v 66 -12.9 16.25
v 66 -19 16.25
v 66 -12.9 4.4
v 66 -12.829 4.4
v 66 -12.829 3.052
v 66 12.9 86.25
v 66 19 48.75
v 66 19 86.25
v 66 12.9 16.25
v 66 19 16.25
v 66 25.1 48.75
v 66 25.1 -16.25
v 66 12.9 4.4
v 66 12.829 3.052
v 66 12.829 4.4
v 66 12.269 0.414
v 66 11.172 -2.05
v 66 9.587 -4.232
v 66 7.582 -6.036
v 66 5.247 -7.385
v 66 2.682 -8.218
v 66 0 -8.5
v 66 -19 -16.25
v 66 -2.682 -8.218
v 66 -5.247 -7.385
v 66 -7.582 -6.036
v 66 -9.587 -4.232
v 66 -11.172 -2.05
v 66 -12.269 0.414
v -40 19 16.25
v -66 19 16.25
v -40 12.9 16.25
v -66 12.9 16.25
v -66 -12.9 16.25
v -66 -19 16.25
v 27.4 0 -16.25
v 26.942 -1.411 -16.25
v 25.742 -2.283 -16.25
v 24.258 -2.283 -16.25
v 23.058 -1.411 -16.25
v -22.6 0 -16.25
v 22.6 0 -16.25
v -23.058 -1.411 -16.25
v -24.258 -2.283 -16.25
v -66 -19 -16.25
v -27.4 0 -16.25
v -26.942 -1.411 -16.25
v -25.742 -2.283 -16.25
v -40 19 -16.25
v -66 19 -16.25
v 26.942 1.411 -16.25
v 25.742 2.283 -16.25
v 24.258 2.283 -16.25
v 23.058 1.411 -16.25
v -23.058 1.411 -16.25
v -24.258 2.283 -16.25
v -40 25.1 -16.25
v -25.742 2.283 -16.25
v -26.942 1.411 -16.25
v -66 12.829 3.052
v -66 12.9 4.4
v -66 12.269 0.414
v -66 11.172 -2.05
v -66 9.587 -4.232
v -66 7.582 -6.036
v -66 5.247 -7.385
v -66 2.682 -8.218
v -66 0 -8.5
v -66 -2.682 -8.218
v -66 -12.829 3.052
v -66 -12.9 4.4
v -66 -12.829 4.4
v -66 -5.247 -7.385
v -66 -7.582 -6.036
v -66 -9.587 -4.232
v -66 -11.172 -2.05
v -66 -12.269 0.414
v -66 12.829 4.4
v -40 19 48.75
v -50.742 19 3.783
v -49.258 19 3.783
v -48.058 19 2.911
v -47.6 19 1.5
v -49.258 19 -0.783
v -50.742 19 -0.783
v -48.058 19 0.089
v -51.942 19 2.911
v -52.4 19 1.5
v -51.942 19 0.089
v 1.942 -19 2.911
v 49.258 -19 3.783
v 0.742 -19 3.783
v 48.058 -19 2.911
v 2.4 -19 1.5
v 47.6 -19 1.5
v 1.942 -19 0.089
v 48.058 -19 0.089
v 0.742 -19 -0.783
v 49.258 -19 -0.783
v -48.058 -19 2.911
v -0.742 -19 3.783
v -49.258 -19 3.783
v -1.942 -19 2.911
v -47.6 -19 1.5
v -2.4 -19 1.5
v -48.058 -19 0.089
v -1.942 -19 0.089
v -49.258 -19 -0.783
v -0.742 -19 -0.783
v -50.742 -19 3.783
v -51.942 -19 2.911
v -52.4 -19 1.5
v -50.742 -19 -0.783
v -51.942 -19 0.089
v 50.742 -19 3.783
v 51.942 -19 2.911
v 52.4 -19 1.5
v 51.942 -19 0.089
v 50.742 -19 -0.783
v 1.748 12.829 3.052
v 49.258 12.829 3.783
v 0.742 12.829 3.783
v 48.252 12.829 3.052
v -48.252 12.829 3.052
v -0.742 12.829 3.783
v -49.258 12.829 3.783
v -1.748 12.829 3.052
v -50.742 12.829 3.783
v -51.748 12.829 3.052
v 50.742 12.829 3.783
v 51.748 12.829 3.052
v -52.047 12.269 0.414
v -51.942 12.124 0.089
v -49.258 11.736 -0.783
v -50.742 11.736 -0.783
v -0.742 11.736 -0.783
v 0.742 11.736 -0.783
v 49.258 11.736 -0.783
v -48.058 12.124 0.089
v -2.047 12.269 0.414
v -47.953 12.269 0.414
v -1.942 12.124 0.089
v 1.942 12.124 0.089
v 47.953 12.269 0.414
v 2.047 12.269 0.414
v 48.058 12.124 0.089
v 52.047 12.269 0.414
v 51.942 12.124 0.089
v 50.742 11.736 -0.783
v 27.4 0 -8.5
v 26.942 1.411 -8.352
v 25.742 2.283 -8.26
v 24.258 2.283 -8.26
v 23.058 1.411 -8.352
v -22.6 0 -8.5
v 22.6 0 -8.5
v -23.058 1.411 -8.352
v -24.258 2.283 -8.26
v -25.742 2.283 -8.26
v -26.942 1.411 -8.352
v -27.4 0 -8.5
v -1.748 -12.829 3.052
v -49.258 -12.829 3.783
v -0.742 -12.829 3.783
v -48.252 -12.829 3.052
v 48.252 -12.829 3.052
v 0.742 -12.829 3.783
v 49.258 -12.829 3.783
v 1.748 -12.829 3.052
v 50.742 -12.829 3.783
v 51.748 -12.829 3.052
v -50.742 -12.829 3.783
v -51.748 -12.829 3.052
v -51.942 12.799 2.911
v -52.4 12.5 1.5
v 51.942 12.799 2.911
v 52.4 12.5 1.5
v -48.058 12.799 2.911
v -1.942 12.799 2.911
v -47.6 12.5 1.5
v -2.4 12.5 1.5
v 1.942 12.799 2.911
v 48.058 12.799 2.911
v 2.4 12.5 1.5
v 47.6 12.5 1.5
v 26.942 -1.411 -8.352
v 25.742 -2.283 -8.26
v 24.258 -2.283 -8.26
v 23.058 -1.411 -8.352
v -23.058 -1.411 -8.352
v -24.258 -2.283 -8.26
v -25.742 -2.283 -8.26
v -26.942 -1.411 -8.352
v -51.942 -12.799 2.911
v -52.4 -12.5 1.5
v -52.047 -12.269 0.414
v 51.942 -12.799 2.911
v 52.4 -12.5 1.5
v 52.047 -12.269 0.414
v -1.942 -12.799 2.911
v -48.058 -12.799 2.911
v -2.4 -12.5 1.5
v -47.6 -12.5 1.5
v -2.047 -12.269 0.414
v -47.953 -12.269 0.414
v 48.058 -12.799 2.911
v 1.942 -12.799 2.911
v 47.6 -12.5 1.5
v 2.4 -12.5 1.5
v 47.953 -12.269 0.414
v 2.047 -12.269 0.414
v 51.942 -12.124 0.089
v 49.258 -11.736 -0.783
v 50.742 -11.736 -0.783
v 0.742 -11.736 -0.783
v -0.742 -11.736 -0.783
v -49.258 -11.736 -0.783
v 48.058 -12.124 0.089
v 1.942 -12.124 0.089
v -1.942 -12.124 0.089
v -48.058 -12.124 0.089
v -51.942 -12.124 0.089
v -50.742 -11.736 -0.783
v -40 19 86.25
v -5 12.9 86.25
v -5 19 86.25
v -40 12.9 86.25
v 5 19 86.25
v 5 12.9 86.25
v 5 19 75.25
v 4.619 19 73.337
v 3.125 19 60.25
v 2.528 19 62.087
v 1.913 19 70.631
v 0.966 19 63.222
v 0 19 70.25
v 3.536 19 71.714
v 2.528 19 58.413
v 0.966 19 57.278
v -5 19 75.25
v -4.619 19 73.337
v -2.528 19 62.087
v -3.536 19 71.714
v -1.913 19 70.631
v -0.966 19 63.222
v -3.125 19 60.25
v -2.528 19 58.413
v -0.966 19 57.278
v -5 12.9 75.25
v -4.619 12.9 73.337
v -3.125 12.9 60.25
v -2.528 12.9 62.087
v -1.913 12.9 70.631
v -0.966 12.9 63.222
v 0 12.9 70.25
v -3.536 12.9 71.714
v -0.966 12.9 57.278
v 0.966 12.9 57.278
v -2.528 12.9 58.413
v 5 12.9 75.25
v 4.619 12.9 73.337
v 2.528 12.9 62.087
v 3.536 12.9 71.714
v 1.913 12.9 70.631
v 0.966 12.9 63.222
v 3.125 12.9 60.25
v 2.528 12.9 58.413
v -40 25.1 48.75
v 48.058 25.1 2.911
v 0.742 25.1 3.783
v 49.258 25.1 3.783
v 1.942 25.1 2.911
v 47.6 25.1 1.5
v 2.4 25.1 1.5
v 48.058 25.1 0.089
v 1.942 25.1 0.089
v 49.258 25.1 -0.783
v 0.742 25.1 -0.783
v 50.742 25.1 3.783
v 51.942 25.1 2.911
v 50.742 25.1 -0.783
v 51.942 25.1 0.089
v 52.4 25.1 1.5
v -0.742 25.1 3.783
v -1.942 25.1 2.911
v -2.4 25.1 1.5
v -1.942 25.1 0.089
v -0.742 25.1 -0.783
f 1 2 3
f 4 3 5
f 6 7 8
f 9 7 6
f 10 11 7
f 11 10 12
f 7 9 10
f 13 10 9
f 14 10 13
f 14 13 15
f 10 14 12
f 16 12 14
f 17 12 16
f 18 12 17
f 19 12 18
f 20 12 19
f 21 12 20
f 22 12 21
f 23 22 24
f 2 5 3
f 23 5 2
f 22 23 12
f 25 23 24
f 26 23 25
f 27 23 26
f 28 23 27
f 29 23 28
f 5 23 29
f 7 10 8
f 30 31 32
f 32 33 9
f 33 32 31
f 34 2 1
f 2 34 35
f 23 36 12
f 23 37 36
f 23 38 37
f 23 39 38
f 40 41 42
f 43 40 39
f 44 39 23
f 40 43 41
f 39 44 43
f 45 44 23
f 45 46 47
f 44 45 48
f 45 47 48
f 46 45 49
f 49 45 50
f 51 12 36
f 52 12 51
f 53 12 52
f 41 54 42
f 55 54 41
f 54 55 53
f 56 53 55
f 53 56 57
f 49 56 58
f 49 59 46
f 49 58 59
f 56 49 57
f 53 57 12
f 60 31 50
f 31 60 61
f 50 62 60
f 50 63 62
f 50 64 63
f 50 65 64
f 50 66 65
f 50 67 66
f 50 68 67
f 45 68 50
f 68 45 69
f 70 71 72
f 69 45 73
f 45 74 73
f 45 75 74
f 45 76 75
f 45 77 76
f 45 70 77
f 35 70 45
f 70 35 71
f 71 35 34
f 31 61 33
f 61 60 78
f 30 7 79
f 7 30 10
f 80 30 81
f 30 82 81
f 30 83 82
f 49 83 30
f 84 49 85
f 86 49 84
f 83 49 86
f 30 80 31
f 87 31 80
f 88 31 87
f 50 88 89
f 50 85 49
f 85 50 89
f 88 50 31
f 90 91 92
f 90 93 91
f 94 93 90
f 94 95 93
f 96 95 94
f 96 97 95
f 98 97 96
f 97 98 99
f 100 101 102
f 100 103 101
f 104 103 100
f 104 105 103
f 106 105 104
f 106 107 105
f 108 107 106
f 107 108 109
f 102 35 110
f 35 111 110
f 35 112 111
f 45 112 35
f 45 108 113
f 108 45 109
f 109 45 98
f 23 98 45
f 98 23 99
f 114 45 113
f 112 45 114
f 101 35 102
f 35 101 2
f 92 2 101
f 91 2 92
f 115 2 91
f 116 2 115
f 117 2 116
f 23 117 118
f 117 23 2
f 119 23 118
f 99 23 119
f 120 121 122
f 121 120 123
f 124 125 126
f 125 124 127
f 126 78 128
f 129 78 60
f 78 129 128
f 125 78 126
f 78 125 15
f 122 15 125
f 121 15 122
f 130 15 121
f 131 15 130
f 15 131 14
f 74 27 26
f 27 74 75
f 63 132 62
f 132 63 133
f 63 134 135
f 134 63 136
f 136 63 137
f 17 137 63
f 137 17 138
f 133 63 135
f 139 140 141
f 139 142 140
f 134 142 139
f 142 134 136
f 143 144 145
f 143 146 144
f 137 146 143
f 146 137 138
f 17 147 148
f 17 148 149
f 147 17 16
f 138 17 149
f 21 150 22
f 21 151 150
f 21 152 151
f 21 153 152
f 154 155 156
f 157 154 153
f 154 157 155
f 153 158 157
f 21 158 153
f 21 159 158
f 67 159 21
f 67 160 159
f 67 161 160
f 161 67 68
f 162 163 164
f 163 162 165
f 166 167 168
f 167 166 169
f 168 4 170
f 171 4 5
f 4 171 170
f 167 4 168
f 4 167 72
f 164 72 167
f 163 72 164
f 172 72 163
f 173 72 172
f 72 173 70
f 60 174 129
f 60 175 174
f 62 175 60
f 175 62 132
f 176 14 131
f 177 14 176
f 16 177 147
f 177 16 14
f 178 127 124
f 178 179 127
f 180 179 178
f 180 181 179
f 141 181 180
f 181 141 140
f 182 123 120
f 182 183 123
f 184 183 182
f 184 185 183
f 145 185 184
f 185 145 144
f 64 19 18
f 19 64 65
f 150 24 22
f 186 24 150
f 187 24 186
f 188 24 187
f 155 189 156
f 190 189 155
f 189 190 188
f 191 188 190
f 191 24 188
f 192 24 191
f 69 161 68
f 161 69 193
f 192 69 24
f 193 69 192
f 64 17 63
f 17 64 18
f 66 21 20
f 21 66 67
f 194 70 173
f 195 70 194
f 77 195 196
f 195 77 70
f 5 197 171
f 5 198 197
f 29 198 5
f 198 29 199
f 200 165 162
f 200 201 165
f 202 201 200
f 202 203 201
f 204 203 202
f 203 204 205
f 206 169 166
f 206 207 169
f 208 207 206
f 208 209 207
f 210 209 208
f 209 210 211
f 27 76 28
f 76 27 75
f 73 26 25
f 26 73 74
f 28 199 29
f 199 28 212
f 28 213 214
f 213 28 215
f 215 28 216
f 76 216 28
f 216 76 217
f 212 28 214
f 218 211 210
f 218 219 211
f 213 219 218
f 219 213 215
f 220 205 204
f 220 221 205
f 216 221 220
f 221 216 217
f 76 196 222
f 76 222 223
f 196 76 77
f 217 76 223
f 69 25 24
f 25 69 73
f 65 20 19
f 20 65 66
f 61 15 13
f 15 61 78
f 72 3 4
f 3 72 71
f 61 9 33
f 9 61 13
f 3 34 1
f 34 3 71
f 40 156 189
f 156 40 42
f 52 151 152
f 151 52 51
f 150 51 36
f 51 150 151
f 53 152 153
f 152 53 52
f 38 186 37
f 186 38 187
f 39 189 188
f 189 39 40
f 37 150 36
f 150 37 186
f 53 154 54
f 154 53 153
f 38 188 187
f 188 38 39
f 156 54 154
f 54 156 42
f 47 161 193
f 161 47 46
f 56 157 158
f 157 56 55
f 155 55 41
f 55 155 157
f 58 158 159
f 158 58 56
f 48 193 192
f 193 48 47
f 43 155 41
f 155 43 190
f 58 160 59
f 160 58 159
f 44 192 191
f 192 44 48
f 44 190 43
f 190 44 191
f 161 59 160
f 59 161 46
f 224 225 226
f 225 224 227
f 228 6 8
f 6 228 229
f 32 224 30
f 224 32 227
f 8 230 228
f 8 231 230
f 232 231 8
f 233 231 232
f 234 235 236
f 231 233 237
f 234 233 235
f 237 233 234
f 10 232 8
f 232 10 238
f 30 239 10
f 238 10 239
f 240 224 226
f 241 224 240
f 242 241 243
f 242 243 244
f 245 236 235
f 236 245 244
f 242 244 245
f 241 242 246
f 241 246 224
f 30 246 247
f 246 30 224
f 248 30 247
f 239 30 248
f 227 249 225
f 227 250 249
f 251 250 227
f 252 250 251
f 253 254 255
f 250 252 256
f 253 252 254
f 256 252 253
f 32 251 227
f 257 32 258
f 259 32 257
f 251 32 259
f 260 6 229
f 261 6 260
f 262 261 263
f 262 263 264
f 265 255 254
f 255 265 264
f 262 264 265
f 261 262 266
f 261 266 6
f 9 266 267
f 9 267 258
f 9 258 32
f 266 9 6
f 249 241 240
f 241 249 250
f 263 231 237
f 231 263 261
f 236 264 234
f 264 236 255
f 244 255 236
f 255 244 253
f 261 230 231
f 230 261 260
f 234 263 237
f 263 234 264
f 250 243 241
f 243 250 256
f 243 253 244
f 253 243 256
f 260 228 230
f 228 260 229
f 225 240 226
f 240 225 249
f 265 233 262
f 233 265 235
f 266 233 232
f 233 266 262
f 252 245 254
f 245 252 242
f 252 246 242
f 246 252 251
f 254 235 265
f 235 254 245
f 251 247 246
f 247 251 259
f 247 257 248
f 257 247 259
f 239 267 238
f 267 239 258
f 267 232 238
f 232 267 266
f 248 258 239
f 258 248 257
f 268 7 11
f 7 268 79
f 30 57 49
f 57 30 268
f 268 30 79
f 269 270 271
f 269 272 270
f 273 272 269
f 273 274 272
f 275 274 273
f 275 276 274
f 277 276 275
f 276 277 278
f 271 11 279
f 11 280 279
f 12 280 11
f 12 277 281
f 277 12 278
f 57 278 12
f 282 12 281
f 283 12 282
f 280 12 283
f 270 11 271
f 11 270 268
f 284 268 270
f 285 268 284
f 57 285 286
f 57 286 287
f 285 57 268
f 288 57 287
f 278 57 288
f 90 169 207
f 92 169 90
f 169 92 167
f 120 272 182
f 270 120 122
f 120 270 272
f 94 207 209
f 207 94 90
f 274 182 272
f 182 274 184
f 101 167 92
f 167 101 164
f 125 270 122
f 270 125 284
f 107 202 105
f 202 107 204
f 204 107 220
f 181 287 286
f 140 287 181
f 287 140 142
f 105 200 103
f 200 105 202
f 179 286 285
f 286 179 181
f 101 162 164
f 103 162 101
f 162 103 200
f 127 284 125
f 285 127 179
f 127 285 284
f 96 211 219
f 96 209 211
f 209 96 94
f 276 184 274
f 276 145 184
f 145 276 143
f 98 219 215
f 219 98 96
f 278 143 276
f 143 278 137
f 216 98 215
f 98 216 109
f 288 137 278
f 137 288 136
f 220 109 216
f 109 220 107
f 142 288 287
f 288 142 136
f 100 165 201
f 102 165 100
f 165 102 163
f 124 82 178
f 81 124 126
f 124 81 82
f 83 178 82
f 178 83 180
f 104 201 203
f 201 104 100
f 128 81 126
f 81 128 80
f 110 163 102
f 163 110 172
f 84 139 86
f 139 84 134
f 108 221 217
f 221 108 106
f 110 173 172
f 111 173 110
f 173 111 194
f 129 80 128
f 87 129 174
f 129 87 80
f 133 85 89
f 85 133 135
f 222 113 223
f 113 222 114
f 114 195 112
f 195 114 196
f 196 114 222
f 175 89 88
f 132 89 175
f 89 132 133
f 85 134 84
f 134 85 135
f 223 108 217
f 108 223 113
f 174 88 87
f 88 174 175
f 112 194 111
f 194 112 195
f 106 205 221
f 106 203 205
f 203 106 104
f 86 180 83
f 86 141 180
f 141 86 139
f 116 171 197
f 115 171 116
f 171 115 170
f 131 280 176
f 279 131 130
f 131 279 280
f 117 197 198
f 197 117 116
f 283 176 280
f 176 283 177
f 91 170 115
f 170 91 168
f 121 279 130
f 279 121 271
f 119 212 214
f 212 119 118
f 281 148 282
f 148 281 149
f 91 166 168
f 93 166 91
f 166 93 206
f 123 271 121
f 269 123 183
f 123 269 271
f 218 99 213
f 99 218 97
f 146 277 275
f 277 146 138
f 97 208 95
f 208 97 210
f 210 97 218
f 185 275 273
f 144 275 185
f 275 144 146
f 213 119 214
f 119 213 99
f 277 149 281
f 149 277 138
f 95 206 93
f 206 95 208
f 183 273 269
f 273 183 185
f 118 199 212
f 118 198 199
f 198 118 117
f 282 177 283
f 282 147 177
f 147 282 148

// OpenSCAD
nakladka_sz = 38; //31.4
nakladka_dl = 132;
nakladka_h = 32.5;
dno_grubosc = 7.75;

rama_sr = 25.8;

sruba_sr = 4.8;
sruba_od_dna = 15.35;
sruba_od_boku = 12.7;
sruby_odstep = 50;

mocowanie_h = 50+20; //35
mocowanie_sr1 = 10; // lub 12
mocowanie_gr = (nakladka_sz-rama_sr)/2;
mocowanie_dl = 80;

module sruba_dziura(sr){
    rotate([90,0,0]){
        cylinder(h=nakladka_sz+30, d=sr, center=true, $fn=10);
        
    }
}

module mocowanie(h, sr1, gr, dl, sr2){
    difference(){
        translate([(nakladka_dl-dl)/4,0,0]){
    cube([dl+(nakladka_dl-dl)/2, gr, h],center = true);
        }
    translate([0,0,h/2-16+sr1/2]){
    rotate([90,0,0]){
      #cylinder(gr+10, d=sr1, center=true);   
    }
    }
    translate([0,0,h-16+sr1/2]){
        cube([sr1, gr+10, h],center = true);
    }
    translate([0,0,h/2-16+sr1/2-15]){
    rotate([90,0,0]){
    #cylinder(gr+10, d=sr2, center=true);
    }
    }
    
    }
}

difference(){
union(){
    difference(){
        cube([nakladka_dl, nakladka_sz, nakladka_h], center=true);
        
        translate([0,0,-nakladka_h/2+dno_grubosc+rama_sr/2]){
        rotate([0,90,0]){
            cylinder(h=nakladka_dl+30, d=rama_sr, center=true);
            
        }
        }
        
        translate([0,0,dno_grubosc+rama_sr/2]){
            cube([nakladka_dl+30, rama_sr, nakladka_h],center = true);
        }
        translate([25,0,0]){
            rotate([-90,0,0]){
                sruba_dziura(sruba_sr); 
            }
        }
         translate([-25,0,0]){
            rotate([-90,0,0]){
                sruba_dziura(sruba_sr); 
            }
        }
    }

    translate([0,nakladka_sz/2-mocowanie_gr/2,nakladka_h/2+mocowanie_h/2]){
        mocowanie(mocowanie_h, mocowanie_sr1, mocowanie_gr, mocowanie_dl, 6.25);
    }
    
    translate([(nakladka_dl-mocowanie_dl)/4,nakladka_sz/2+mocowanie_gr/2,32.5-nakladka_h/2]){
        cube([mocowanie_dl+(nakladka_dl-mocowanie_dl)/2, mocowanie_gr,65],center = true);
    }

}

        translate([0,0,-nakladka_h/2+sruba_sr/2+sruba_od_dna]){
            sruba_dziura(sruba_sr);
            
            translate([-sruby_odstep,0,0]){
               sruba_dziura(sruba_sr); 
            }
            
             translate([sruby_odstep,0,0]){
               sruba_dziura(sruba_sr); 
            }
        }
        
}
